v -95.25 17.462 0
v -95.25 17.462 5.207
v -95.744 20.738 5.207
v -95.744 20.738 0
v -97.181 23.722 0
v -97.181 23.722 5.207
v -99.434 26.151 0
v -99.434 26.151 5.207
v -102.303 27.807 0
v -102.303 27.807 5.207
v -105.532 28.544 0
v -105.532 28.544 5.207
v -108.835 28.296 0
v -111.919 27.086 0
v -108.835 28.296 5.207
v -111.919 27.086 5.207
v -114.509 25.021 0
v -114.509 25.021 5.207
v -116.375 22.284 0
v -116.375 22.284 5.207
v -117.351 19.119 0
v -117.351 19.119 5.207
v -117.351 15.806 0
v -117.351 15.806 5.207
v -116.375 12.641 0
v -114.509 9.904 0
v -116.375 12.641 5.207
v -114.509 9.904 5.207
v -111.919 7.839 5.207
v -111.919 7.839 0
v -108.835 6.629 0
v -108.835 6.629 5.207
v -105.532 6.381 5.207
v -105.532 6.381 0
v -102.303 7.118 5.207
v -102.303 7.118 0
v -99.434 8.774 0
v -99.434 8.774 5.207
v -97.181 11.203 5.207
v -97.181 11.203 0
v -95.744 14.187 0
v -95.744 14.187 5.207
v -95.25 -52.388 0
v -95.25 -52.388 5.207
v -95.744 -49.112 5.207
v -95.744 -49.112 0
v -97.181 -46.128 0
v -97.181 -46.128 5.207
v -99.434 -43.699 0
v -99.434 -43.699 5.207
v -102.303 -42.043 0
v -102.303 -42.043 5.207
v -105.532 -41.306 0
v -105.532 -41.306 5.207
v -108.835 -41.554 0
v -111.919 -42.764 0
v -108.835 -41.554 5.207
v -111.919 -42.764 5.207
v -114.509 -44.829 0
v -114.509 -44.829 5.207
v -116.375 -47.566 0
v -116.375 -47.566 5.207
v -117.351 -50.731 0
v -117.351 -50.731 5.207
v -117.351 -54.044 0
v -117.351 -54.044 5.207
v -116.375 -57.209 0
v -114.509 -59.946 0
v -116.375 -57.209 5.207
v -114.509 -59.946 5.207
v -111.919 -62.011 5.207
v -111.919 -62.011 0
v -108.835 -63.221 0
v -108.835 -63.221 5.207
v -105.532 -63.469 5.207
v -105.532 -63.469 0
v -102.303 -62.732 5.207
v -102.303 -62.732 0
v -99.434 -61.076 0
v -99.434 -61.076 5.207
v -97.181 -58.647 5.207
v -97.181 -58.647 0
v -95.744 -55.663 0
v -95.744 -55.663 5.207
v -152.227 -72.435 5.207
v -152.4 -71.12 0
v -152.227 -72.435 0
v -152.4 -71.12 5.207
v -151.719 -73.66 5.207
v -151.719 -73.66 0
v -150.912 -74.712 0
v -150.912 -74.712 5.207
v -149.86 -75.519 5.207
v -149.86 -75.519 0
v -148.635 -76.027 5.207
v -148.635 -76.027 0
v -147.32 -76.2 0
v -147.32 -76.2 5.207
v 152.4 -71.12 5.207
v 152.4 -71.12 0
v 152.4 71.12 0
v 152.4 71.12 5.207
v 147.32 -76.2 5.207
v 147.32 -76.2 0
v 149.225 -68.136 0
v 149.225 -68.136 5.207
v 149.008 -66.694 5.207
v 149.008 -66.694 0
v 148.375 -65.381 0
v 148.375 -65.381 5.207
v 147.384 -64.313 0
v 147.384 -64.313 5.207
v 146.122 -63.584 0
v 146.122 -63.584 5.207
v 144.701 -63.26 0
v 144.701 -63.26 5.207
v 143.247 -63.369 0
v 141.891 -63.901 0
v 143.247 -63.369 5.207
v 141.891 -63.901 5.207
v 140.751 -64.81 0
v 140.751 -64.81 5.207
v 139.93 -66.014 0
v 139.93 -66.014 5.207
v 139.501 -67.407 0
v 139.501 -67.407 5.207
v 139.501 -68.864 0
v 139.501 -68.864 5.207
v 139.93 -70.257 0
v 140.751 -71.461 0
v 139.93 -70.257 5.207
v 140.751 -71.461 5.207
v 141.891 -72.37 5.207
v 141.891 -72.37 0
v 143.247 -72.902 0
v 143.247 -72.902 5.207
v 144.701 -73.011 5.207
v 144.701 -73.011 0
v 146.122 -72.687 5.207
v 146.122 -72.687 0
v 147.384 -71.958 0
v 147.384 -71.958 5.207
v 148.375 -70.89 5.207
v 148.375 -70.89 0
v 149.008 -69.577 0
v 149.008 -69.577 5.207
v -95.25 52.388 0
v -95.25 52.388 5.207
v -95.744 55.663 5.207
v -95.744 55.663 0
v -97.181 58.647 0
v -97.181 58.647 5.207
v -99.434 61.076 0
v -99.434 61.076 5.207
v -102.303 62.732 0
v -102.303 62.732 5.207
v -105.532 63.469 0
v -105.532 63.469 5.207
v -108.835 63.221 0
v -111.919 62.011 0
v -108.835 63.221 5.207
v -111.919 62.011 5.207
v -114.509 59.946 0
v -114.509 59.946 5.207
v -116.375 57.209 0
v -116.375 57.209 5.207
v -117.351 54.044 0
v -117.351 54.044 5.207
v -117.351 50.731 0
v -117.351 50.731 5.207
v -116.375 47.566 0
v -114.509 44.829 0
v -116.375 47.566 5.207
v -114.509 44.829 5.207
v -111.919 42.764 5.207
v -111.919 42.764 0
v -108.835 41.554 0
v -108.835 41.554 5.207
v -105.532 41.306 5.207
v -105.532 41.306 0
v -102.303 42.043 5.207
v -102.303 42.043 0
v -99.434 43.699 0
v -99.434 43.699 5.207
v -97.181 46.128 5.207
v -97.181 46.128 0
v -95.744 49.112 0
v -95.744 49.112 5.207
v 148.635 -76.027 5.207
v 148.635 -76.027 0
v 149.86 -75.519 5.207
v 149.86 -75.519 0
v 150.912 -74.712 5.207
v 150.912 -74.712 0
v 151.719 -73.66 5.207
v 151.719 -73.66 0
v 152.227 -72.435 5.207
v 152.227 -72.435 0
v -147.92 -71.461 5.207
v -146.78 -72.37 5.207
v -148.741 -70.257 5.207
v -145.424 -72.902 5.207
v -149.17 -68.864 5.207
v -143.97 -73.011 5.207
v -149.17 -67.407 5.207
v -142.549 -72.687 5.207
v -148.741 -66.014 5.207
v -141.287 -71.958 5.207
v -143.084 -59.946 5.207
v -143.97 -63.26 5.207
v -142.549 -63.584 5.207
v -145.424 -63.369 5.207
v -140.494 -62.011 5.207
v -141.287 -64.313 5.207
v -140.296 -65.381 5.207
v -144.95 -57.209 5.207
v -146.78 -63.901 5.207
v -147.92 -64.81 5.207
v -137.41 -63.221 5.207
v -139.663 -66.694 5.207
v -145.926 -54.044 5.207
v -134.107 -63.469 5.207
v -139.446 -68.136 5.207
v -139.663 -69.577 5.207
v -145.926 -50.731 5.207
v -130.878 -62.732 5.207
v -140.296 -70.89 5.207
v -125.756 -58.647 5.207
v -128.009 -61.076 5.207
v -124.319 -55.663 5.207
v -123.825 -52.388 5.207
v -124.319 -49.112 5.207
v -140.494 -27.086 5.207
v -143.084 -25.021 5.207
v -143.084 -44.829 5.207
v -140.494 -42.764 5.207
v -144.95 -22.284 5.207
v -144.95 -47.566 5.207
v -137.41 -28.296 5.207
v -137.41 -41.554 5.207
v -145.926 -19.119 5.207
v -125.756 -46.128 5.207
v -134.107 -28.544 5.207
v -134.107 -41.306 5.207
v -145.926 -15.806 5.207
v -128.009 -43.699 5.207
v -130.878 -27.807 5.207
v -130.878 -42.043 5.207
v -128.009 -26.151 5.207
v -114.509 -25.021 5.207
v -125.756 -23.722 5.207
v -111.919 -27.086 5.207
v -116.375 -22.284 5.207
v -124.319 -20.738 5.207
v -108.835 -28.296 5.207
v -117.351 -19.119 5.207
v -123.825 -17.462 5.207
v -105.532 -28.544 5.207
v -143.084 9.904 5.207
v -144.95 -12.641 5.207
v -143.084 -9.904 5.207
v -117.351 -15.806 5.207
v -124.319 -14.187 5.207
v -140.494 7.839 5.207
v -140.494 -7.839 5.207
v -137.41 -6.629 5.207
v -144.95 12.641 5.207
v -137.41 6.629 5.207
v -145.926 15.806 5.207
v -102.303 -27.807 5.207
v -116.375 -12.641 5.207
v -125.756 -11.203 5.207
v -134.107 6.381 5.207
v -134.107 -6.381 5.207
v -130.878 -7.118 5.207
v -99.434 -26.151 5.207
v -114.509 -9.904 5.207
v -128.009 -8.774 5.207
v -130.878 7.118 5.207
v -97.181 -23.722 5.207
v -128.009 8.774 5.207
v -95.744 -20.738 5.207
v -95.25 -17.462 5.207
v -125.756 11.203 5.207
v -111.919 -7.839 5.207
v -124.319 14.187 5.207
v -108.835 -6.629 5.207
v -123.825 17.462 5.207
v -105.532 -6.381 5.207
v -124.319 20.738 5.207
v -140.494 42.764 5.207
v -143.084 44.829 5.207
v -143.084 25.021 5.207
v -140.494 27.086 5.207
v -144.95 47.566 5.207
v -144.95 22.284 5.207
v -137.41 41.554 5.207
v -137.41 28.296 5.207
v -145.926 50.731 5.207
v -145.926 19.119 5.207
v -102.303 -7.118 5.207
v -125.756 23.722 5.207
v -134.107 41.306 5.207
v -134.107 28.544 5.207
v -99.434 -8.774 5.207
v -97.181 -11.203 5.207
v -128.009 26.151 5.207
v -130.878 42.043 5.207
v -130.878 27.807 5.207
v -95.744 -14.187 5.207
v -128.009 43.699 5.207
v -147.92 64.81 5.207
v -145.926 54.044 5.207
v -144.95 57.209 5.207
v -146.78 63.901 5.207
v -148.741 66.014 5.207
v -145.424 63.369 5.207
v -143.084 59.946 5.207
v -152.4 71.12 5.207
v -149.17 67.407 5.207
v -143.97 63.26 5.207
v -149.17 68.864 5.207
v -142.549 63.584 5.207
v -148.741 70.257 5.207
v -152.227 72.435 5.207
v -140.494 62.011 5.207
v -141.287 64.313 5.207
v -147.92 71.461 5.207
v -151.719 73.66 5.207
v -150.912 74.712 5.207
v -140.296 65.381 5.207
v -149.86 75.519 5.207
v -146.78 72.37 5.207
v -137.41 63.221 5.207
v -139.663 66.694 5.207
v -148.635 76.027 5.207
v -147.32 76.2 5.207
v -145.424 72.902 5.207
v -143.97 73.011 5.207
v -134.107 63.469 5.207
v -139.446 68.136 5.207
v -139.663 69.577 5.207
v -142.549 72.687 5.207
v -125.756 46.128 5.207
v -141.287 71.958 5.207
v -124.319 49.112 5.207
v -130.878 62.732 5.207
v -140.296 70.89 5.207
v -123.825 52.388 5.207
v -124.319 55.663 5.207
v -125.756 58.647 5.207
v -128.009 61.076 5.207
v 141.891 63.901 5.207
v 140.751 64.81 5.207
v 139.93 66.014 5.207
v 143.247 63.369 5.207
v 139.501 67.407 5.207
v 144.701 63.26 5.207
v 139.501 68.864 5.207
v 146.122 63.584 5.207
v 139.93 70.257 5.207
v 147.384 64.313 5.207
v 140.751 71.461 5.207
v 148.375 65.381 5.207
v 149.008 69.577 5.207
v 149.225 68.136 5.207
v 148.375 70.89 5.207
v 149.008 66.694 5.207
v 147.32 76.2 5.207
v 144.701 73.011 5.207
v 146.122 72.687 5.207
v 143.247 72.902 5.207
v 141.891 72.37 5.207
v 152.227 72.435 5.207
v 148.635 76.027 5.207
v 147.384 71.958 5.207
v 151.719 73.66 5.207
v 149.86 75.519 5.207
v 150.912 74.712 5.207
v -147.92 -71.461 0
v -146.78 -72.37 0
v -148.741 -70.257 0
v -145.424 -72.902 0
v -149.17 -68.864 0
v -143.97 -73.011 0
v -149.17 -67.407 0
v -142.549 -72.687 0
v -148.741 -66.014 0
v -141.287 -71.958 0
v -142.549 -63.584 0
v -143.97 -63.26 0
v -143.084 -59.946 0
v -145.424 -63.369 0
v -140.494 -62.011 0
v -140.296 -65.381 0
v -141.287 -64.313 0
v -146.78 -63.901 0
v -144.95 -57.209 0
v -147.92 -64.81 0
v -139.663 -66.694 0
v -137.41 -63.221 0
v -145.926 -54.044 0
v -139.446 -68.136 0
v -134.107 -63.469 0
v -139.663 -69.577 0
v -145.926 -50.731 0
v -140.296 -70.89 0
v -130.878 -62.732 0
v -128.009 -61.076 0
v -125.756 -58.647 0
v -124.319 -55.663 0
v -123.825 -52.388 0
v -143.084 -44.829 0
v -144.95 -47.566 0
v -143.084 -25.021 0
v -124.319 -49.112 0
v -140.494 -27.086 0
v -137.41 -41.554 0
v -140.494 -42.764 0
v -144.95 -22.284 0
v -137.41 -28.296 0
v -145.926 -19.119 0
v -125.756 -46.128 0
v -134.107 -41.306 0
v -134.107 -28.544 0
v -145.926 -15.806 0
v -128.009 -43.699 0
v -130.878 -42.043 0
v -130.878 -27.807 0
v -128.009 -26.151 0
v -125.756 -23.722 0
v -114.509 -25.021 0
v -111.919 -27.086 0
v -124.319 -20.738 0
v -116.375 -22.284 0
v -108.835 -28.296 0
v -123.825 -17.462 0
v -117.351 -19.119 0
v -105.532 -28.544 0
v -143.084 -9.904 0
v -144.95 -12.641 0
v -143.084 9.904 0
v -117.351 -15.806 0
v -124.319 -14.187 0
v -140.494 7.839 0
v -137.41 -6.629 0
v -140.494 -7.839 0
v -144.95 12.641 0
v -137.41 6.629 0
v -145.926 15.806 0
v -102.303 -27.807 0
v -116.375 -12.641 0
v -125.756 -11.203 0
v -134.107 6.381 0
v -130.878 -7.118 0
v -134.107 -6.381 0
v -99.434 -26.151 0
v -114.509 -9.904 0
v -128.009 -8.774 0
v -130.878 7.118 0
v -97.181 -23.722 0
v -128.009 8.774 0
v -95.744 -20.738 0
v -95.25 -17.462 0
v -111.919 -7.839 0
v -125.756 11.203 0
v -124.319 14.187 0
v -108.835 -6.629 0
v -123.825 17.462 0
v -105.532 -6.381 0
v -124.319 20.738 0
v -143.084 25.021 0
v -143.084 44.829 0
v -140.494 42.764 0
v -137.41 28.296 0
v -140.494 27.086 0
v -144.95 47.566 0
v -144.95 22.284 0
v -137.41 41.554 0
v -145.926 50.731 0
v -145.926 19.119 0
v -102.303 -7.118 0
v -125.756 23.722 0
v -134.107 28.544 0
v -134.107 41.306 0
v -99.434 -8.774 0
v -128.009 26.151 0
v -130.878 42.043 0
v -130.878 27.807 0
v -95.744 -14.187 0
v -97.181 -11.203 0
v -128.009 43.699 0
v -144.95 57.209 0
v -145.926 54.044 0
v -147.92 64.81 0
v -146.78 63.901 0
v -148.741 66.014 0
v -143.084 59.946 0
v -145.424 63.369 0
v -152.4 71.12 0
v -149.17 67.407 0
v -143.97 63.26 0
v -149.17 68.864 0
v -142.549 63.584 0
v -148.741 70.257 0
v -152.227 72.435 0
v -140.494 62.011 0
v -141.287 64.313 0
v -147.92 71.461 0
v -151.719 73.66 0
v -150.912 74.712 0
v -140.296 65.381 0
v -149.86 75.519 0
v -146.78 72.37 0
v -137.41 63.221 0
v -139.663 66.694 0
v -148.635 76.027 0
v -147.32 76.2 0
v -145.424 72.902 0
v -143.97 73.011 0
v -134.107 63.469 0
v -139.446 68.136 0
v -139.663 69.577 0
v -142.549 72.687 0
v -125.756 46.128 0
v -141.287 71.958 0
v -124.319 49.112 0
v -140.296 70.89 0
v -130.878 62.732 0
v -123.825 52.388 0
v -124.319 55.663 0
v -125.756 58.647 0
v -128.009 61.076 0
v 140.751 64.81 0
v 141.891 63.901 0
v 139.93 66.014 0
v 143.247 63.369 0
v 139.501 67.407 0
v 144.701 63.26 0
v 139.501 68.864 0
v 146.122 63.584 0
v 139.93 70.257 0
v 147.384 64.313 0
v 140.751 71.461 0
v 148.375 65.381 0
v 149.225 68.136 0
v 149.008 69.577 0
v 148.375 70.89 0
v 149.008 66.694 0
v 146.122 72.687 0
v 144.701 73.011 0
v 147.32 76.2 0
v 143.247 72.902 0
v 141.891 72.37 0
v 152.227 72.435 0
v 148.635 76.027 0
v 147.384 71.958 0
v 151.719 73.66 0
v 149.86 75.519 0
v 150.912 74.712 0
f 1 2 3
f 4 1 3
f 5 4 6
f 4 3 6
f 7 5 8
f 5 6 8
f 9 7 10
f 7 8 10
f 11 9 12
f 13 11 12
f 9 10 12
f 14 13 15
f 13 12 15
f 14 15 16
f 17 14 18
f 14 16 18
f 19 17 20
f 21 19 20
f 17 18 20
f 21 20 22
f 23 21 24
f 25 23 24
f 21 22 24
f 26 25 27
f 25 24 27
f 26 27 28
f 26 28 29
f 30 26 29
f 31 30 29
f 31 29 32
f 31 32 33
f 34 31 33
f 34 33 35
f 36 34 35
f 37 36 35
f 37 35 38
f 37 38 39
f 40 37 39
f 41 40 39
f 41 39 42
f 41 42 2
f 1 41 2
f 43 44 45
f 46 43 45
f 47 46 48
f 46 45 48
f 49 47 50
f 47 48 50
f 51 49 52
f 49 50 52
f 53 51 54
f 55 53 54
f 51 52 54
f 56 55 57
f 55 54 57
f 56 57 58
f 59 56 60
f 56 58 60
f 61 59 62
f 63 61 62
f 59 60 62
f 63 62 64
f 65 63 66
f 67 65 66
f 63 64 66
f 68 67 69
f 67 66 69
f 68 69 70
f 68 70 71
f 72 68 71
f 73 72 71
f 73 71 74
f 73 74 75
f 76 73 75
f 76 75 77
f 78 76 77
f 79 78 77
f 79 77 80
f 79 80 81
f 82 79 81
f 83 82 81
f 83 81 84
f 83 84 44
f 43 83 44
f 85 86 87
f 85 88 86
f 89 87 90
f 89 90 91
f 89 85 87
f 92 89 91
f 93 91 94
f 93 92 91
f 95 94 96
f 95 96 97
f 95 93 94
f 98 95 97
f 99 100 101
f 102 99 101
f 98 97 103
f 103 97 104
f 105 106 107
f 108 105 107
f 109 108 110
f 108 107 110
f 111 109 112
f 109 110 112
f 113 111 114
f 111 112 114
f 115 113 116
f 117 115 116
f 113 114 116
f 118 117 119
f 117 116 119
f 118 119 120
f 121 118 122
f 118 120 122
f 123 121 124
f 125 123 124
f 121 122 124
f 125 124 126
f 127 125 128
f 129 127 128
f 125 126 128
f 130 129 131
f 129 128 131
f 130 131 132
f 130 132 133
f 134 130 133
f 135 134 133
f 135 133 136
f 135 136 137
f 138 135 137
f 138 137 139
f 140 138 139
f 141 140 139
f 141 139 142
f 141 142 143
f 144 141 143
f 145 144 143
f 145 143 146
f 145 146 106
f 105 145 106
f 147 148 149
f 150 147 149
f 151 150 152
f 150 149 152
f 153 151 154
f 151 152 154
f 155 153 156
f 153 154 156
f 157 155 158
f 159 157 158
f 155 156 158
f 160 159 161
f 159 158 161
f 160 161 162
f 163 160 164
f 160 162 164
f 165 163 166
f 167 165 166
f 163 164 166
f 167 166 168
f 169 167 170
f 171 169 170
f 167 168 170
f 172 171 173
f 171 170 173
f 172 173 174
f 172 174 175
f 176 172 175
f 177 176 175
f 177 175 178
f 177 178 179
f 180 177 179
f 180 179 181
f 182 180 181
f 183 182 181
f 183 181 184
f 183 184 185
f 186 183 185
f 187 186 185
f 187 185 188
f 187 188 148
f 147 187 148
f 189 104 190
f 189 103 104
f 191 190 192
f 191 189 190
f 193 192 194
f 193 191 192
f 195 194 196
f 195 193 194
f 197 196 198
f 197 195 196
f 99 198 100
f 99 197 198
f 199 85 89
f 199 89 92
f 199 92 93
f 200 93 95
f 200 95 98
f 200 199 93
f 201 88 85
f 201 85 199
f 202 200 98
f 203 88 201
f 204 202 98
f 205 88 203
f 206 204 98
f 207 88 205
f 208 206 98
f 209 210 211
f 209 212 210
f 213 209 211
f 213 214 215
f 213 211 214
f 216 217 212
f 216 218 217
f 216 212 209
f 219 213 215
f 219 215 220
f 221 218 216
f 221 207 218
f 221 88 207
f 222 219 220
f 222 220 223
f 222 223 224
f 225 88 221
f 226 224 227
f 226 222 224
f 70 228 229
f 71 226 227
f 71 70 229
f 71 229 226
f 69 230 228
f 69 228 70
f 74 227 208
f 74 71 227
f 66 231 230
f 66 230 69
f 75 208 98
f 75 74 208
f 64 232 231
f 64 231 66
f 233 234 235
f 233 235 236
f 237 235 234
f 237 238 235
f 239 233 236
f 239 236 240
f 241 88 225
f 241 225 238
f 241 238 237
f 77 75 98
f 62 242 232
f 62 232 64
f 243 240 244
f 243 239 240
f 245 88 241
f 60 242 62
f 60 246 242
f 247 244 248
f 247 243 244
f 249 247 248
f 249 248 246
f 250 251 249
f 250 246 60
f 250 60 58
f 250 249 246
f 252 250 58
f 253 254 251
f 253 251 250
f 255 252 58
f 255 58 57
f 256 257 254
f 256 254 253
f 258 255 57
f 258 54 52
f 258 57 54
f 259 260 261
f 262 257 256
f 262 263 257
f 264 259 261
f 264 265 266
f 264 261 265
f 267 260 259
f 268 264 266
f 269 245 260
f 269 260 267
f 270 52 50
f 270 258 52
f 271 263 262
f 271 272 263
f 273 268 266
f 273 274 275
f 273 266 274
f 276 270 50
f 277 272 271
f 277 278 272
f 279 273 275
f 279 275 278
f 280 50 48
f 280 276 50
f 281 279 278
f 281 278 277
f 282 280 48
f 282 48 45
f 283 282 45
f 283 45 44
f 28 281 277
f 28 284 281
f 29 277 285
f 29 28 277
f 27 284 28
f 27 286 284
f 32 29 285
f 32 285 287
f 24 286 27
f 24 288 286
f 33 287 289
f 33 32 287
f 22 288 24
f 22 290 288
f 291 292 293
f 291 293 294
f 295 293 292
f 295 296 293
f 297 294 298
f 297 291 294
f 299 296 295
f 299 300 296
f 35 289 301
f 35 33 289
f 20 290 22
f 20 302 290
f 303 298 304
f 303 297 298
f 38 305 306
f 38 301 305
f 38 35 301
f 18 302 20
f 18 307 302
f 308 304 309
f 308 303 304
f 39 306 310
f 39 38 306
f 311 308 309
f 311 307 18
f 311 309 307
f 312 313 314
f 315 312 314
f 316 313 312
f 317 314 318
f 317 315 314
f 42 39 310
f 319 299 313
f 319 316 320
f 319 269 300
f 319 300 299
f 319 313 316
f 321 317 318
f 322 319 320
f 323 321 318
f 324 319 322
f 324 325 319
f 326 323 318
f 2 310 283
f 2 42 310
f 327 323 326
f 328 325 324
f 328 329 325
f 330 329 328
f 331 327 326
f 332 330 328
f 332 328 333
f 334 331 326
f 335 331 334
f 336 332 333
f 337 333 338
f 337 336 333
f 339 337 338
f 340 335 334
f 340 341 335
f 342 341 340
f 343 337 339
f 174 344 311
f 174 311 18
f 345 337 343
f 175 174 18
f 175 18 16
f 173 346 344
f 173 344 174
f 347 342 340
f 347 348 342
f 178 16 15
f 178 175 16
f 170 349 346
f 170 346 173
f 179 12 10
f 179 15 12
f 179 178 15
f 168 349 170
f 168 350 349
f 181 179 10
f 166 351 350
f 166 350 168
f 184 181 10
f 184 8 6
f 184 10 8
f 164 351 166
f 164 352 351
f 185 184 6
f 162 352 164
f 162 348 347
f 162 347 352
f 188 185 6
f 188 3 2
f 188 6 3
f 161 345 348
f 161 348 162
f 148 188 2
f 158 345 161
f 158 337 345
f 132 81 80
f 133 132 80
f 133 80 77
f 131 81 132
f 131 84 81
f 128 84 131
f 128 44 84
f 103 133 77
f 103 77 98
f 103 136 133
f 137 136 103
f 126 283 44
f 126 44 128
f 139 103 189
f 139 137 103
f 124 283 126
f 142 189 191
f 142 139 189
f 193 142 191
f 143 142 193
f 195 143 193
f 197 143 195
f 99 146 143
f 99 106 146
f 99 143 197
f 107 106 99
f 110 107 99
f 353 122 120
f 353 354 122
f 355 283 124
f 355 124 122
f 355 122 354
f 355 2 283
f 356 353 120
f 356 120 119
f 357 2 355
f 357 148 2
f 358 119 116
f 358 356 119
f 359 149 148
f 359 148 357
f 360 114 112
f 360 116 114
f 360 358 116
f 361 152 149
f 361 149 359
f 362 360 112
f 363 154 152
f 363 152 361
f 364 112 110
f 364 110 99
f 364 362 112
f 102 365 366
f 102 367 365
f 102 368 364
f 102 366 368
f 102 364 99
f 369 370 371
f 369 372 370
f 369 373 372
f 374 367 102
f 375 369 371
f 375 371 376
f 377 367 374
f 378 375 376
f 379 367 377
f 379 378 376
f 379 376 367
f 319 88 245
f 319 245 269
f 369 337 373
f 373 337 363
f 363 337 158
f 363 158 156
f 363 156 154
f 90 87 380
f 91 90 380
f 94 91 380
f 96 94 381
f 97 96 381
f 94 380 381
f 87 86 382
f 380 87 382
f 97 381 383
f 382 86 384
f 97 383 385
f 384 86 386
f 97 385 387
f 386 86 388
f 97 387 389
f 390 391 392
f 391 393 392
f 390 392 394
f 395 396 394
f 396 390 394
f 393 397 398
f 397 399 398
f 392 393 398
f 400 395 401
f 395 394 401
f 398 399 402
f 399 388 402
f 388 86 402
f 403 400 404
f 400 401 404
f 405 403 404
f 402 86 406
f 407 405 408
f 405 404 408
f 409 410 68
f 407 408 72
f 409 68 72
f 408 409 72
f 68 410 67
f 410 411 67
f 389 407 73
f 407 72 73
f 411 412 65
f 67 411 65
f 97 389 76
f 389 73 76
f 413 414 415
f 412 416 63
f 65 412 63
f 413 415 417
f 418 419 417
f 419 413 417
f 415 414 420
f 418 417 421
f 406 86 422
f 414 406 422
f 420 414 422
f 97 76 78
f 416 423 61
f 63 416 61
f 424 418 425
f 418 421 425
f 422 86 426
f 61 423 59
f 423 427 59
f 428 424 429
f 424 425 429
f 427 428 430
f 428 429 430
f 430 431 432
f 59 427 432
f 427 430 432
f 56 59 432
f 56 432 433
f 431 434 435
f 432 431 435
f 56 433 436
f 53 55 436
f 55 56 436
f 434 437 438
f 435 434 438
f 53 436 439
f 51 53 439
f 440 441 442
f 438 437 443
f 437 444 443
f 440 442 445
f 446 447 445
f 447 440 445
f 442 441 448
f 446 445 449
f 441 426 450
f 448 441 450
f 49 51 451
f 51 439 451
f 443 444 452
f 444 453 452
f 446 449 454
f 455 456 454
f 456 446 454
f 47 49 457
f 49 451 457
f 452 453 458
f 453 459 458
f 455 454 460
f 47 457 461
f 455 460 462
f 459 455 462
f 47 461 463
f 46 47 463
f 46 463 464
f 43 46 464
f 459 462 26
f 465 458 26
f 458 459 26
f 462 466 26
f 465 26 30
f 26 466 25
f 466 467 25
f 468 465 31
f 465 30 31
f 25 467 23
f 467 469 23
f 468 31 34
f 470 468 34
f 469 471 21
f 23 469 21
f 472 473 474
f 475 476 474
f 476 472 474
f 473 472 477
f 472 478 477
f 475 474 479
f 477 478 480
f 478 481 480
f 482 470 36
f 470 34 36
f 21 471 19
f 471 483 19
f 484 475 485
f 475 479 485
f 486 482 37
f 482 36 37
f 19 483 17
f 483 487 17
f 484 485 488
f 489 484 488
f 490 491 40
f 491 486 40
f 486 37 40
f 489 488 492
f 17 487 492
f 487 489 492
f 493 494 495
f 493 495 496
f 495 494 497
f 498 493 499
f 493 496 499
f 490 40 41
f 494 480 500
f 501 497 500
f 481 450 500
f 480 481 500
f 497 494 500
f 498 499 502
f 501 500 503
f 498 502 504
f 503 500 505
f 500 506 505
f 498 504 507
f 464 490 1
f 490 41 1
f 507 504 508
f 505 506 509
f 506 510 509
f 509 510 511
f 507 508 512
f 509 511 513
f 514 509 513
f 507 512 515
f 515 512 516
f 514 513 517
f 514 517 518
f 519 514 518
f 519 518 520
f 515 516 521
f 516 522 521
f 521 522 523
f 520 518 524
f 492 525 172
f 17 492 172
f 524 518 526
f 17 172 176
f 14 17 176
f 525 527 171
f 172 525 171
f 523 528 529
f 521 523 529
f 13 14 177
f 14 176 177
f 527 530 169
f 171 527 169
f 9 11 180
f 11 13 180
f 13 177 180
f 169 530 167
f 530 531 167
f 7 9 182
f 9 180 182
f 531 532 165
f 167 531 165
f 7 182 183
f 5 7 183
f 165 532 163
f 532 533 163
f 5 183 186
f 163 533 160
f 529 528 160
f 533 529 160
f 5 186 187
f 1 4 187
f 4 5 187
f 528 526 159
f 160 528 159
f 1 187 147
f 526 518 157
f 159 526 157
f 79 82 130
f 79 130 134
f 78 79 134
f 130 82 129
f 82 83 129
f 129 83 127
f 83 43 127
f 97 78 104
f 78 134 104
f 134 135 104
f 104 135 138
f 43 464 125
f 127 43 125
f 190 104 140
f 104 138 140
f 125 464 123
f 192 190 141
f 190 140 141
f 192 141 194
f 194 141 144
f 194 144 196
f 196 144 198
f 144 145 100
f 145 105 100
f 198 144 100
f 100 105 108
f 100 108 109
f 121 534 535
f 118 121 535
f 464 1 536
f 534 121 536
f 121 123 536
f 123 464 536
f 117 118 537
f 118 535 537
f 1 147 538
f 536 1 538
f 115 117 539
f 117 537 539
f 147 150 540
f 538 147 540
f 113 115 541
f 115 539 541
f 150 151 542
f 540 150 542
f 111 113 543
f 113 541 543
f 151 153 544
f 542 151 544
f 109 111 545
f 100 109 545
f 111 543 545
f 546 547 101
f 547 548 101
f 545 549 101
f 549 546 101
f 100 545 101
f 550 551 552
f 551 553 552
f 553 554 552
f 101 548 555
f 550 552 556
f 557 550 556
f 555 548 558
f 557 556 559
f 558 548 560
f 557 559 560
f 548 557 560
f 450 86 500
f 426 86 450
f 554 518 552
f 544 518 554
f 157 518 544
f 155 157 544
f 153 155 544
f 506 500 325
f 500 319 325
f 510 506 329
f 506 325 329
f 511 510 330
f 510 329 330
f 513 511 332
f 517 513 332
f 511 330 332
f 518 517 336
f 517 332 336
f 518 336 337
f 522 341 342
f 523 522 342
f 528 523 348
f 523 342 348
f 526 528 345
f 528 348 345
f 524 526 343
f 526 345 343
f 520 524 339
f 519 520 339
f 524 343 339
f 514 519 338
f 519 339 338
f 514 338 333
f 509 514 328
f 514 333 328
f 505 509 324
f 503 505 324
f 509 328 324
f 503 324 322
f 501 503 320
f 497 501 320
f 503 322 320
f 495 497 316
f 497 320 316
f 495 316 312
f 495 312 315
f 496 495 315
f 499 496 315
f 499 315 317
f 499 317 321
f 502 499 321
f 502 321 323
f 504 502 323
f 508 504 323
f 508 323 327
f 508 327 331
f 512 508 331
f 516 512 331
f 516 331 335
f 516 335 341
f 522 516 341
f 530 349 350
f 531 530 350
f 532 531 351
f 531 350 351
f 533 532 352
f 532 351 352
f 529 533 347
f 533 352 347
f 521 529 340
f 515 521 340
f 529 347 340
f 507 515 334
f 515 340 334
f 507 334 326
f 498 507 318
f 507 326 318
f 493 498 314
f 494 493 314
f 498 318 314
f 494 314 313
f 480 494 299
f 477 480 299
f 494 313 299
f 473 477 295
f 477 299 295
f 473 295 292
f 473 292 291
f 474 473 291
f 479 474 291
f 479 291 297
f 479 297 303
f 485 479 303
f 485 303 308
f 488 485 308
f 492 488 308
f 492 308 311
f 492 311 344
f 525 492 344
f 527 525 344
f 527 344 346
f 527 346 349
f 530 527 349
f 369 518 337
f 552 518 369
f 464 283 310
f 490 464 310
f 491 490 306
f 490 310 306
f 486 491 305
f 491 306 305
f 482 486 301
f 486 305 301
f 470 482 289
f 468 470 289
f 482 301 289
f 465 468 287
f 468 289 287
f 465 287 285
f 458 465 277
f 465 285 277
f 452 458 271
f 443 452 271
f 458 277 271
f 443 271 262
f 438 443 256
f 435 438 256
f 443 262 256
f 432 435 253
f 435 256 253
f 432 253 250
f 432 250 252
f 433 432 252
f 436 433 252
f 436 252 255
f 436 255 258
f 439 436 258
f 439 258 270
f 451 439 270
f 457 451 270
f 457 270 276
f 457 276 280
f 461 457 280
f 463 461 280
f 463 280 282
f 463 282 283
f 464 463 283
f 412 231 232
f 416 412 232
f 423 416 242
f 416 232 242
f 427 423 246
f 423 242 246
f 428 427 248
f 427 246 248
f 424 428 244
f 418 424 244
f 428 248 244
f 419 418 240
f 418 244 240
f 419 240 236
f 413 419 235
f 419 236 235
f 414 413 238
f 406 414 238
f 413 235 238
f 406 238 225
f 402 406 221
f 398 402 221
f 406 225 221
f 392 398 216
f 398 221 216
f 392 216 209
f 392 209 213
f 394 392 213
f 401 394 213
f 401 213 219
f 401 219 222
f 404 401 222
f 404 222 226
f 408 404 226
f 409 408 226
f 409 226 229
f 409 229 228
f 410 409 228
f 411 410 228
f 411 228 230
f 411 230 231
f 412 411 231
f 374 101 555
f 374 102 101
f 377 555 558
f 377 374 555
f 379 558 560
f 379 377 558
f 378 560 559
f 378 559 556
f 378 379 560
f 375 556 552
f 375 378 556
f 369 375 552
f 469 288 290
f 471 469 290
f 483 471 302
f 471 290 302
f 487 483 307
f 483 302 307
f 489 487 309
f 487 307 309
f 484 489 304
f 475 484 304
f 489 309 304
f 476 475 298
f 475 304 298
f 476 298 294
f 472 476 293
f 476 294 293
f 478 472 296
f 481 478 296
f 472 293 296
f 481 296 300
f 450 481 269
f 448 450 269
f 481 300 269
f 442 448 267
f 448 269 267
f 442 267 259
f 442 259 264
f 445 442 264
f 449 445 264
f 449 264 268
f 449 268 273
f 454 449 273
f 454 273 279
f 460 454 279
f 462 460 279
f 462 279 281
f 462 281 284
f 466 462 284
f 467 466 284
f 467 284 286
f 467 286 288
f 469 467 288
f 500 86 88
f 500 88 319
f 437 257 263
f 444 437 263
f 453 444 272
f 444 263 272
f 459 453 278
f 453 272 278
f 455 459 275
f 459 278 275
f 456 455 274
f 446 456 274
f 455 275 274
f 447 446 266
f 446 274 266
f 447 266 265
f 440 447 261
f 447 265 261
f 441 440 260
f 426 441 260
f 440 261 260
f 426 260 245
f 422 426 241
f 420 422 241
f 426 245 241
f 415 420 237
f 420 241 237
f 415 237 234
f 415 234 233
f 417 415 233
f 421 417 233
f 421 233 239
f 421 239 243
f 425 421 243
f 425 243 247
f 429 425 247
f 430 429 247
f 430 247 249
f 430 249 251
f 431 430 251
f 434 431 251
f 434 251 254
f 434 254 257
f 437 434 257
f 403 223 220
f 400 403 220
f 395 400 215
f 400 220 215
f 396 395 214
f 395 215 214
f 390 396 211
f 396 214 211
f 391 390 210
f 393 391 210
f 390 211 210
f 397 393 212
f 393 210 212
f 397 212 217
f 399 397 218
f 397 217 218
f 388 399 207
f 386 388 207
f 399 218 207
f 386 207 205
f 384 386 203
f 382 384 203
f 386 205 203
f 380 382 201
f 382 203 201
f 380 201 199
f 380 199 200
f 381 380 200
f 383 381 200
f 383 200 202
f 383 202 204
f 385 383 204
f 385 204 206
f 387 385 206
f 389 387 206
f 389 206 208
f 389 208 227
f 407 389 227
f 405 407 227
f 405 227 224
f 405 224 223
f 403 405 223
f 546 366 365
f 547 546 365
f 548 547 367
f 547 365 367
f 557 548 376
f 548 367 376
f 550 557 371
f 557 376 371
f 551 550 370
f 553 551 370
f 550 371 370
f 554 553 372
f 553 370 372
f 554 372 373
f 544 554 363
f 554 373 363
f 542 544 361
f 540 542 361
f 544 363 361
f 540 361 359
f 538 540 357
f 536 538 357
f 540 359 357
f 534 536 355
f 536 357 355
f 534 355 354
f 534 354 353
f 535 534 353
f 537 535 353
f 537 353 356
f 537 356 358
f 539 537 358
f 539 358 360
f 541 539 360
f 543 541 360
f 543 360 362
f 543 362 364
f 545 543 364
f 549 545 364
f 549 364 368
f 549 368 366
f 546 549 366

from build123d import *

# Parameters (mm, degrees)
F0_W     = 304.8
F0_H     = 152.4
F1_DEPTH = 5.207
F2_R     = 5.08
F3_R     = 4.8895
F4_DEPTH = 5.208
F5_R     = 11.1125
F6_DEPTH = 5.208


with BuildPart() as f1:
    # F0 (on Top) → F1 (new body)
    with BuildSketch(Plane.XY):
        Rectangle(F0_W, F0_H)
    extrude(amount=F1_DEPTH)

    # F2
    f2_edges = [f1.edges().sort_by_distance(p)[0] for p in [
        (-152.4, 76.2, 2.6035),
        (-152.4, -76.2, 2.6035),
        (152.4, 76.2, 2.6035),
        (152.4, -76.2, 2.6035),
    ]]
    fillet(f2_edges, radius=F2_R)

    # F3 (on face) → F4 (cut, through all)
    with BuildSketch(Plane.XY.offset(5.207)):
        with Locations((-144.3355, 68.1355)):
            Circle(F3_R)
        with Locations((-144.3355, -68.1355)):
            Circle(F3_R)
        with Locations((144.3355, 68.1355)):
            Circle(F3_R)
        with Locations((144.3355, -68.1355)):
            Circle(F3_R)
    extrude(amount=-F4_DEPTH, mode=Mode.SUBTRACT)

    # F5 (on face) → F6 (cut, through all)
    with BuildSketch(Plane.XY.offset(5.207)):
        with Locations((-106.3625, -52.3875)):
            Circle(F5_R)
        with Locations((-134.9375, -52.3875)):
            Circle(F5_R)
        with Locations((-134.9375, -17.4625)):
            Circle(F5_R)
        with Locations((-106.3625, -17.4625)):
            Circle(F5_R)
        with Locations((-134.9375, 17.4625)):
            Circle(F5_R)
        with Locations((-106.3625, 17.4625)):
            Circle(F5_R)
        with Locations((-134.9375, 52.3875)):
            Circle(F5_R)
        with Locations((-106.3625, 52.3875)):
            Circle(F5_R)
    extrude(amount=-F6_DEPTH, mode=Mode.SUBTRACT)


solid = f1.part
